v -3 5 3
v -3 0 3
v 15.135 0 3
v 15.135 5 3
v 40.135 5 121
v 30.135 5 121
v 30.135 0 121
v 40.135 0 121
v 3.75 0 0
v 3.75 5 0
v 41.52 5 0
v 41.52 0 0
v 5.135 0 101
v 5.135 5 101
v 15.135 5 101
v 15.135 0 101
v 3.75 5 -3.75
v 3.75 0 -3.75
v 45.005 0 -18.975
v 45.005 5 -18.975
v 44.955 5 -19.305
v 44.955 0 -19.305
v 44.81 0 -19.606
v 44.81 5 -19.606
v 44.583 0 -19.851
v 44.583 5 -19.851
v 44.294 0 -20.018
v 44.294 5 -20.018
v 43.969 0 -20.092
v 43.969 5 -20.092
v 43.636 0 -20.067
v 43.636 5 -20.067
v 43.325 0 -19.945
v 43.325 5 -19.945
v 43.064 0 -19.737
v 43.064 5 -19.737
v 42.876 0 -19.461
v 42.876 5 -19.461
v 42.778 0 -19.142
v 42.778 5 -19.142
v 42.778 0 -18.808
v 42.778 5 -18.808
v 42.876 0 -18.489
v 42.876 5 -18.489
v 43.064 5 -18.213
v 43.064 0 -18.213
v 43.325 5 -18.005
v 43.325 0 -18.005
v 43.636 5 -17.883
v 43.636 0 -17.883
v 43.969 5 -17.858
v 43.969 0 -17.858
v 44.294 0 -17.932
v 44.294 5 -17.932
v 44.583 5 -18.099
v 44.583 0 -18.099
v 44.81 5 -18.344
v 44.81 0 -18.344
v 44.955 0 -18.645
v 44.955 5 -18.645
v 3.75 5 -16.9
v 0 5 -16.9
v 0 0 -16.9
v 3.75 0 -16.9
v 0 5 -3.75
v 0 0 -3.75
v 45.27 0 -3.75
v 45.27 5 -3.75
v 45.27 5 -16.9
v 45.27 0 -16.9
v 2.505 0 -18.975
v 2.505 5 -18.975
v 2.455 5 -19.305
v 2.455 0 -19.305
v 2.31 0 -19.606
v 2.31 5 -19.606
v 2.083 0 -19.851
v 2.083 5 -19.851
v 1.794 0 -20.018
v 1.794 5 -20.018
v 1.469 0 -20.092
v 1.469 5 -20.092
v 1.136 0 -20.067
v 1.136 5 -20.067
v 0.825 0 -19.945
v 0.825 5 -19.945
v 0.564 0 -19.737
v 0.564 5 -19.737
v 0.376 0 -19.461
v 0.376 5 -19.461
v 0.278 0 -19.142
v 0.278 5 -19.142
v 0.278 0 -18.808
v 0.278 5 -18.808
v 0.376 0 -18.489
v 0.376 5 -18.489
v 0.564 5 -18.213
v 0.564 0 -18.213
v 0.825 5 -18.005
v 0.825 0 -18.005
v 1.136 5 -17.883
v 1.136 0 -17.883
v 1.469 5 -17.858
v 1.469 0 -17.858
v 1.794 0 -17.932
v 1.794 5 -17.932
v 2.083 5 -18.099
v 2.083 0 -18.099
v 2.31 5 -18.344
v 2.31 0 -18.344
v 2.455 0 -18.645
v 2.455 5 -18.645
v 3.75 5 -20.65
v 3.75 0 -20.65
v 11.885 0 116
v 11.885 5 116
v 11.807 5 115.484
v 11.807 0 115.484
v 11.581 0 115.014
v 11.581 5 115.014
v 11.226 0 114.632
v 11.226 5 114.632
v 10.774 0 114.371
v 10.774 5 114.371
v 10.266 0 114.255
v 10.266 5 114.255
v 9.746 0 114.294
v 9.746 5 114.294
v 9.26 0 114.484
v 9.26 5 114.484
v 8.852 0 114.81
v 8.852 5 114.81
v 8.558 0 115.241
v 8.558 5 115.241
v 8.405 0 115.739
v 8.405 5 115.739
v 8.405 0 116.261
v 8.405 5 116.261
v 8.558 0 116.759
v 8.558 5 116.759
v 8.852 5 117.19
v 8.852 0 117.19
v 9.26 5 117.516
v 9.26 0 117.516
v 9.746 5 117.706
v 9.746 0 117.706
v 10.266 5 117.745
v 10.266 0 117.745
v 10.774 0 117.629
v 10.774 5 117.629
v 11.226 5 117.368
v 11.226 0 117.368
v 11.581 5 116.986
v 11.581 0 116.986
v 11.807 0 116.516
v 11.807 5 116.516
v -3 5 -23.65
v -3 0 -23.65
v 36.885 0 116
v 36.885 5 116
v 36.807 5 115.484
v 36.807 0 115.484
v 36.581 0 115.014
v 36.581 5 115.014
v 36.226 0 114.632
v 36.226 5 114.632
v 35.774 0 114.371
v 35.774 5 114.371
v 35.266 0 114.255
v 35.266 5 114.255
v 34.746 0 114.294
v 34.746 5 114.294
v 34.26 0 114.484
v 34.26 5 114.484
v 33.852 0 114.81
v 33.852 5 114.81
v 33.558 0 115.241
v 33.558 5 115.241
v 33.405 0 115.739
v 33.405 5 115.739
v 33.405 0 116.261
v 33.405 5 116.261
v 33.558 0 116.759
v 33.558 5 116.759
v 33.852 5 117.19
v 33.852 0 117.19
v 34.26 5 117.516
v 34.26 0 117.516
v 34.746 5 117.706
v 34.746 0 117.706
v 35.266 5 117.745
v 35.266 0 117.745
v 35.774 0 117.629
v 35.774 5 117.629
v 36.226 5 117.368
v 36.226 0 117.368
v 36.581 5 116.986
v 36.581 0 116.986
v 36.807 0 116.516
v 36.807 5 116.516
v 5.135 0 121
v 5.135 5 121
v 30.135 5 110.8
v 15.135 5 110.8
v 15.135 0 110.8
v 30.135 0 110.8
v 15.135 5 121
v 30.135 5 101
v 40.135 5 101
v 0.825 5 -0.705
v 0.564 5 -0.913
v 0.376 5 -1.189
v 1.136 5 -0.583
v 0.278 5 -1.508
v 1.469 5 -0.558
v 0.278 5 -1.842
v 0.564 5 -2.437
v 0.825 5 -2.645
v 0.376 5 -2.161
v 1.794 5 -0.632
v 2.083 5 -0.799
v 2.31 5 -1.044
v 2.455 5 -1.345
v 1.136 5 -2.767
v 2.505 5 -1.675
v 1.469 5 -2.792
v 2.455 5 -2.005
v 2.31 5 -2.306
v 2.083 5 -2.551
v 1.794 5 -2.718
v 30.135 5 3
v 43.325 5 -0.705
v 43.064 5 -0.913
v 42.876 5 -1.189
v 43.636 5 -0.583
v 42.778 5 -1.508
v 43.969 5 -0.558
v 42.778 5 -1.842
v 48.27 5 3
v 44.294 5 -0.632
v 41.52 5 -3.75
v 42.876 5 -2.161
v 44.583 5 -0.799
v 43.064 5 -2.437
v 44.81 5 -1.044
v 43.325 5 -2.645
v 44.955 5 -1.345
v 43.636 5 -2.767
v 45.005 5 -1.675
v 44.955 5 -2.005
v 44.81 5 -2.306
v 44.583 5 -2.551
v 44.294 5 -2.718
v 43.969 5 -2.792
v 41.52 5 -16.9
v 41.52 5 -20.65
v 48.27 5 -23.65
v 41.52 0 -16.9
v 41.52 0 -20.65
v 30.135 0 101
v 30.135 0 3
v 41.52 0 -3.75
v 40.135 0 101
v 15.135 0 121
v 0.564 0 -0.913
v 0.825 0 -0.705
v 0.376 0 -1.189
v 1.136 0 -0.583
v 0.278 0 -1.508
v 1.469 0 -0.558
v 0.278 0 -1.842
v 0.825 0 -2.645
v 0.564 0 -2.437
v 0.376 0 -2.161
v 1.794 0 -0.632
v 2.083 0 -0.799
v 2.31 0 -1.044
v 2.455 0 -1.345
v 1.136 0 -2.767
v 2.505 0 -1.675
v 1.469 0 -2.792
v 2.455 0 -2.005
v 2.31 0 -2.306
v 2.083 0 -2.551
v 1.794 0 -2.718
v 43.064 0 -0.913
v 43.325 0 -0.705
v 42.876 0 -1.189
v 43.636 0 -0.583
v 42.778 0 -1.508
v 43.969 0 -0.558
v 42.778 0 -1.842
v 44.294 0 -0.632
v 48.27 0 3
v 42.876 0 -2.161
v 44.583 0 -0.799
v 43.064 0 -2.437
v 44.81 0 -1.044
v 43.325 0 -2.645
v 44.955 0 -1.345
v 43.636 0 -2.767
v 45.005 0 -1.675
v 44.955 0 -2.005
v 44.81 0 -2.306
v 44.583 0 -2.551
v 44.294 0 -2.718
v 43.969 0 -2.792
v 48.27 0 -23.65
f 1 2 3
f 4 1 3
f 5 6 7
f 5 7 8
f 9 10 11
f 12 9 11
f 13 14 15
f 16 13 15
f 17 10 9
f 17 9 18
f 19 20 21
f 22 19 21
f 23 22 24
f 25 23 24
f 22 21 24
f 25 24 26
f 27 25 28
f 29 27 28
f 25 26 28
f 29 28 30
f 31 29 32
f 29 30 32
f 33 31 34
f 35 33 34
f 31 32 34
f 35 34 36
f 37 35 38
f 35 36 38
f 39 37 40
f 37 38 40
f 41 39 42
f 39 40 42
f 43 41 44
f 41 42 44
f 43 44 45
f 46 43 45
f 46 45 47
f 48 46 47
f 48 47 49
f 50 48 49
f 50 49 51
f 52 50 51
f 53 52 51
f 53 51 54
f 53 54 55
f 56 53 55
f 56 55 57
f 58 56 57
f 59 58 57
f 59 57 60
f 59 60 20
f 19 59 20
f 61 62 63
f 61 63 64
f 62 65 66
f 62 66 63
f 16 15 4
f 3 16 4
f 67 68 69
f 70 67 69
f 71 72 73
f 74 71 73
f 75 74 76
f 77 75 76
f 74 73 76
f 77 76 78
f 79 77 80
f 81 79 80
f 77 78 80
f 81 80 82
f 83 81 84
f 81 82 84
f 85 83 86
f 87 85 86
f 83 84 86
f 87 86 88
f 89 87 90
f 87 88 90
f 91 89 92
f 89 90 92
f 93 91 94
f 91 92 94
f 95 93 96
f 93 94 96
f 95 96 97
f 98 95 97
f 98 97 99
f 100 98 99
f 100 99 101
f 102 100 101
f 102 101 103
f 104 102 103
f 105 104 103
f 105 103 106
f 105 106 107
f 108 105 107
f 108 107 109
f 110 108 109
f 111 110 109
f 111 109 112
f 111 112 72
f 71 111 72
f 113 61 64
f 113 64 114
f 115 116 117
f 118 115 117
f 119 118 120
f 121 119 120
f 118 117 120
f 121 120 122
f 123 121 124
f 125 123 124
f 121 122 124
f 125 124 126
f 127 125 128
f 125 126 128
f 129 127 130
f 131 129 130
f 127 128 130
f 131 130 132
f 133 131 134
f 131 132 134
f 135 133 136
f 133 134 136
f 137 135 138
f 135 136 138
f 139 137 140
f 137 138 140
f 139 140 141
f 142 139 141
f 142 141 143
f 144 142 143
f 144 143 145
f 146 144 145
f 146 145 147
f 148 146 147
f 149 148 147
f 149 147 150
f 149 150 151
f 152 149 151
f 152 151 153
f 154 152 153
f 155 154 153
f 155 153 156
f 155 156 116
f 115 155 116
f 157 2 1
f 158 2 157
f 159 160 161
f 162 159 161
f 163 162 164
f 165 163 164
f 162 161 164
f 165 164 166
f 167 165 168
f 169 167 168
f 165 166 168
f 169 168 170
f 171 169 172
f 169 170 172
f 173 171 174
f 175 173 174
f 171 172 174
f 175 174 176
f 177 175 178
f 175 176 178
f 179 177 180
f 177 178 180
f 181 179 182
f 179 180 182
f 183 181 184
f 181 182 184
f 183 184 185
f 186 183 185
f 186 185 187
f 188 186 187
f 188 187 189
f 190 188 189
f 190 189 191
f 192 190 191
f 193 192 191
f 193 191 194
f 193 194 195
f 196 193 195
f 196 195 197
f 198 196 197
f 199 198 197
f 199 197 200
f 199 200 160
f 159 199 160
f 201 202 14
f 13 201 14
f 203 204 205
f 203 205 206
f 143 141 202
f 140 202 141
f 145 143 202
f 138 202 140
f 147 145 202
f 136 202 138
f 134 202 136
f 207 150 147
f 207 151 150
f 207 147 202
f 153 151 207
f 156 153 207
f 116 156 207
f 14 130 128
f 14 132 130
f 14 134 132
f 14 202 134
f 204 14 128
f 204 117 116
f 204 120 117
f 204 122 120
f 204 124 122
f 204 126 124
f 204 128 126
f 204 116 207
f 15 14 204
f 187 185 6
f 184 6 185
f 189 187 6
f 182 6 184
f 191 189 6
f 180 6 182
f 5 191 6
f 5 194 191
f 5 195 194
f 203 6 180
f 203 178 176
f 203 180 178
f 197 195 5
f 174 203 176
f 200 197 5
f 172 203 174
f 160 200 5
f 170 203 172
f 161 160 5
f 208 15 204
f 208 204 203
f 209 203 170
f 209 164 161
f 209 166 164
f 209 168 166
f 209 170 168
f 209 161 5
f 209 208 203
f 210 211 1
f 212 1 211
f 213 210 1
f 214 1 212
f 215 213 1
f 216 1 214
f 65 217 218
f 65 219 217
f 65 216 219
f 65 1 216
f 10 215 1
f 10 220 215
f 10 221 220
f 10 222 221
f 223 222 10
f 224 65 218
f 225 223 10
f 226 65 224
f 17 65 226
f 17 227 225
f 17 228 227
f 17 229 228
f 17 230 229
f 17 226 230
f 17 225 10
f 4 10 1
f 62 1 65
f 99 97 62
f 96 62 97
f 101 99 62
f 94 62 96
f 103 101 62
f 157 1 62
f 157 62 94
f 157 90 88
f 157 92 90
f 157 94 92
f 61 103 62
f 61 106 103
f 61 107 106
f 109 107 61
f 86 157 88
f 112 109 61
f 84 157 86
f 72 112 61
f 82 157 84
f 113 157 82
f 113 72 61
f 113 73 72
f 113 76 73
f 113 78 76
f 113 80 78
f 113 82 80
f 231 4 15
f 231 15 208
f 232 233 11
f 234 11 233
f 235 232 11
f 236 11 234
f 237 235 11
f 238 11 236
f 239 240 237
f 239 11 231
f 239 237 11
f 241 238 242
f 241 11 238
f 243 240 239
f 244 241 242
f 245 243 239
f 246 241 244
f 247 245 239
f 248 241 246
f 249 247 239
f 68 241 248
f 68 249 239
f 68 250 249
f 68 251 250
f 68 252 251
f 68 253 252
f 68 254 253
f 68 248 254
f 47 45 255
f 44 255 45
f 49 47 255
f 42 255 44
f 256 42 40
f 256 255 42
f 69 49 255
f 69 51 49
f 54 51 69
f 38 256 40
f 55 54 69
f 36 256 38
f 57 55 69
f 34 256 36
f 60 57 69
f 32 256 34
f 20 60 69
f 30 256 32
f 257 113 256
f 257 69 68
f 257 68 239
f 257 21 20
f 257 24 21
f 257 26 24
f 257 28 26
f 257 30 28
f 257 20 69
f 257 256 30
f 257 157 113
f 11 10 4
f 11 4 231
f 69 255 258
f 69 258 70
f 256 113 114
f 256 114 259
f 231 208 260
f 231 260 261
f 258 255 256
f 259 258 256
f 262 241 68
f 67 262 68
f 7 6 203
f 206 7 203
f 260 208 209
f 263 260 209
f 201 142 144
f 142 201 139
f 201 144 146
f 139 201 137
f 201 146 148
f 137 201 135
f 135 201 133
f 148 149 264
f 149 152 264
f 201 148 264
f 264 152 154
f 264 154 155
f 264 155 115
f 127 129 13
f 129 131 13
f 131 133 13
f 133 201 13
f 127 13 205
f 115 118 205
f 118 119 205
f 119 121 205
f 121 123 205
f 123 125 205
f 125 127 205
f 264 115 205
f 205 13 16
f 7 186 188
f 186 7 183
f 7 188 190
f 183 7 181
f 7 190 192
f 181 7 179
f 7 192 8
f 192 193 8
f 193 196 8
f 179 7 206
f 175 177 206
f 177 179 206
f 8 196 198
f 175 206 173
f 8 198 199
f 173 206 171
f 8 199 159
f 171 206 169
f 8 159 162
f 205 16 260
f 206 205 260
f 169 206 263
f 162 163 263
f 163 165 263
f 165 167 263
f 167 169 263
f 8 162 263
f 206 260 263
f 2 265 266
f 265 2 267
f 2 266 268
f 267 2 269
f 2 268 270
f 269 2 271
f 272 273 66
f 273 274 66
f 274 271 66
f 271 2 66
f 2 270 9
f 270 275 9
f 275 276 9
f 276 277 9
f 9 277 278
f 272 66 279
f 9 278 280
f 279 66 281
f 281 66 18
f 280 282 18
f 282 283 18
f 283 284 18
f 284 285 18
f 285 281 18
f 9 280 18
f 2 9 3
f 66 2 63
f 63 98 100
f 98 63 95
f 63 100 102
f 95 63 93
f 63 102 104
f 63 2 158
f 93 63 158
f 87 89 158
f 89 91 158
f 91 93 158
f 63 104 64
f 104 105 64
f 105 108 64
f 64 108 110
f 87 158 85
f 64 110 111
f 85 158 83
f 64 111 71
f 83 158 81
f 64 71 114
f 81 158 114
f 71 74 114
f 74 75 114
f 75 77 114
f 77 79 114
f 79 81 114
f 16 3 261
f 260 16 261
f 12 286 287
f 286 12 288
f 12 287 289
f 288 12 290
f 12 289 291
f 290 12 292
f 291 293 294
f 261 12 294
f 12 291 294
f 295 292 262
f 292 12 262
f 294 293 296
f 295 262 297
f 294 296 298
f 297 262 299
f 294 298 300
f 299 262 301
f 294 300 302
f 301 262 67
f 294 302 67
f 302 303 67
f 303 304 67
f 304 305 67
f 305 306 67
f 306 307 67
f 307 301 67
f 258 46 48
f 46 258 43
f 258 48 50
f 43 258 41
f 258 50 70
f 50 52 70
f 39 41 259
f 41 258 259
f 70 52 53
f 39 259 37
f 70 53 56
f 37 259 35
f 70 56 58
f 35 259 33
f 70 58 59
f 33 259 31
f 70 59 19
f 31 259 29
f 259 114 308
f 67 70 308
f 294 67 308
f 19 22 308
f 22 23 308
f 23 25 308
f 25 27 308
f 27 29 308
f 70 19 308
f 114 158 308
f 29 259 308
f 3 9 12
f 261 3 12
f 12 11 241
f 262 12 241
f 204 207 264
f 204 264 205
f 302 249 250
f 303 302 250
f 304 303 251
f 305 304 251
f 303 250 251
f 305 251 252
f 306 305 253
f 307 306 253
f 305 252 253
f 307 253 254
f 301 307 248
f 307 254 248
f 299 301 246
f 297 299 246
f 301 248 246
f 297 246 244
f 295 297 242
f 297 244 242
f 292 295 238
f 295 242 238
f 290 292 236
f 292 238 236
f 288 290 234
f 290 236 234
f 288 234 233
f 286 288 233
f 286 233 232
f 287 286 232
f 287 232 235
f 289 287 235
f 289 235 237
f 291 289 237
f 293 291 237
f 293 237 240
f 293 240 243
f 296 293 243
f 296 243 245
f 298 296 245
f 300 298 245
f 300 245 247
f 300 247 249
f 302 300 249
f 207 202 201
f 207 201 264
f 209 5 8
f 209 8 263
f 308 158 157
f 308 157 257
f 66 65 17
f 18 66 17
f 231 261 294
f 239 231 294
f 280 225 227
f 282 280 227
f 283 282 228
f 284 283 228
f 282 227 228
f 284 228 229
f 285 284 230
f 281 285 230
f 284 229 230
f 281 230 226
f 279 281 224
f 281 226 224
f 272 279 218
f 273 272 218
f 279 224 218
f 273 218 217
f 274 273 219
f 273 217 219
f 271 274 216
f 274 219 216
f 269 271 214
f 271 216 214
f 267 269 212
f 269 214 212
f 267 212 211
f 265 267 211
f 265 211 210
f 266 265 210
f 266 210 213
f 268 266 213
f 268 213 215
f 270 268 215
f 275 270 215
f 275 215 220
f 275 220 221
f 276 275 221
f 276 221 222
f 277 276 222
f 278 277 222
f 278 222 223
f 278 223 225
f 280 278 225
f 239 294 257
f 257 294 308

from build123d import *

# Parameters (mm, degrees)
SKETCH2_W           = 51.27
SKETCH2_H           = 26.65
BOSS_EXTRUDE2_DEPTH = 5
SKETCH3_W           = 45.27
SKETCH3_H           = 20.65
CUT_EXTRUDE1_DEPTH  = 6
SKETCH4_W           = 3.75
SKETCH4_H           = 3.75
BOSS_EXTRUDE3_DEPTH = 5
SKETCH5_R           = 1.12
CUT_EXTRUDE2_DEPTH  = 6
SKETCH6_W           = 15
SKETCH6_H           = 108
BOSS_EXTRUDE4_DEPTH = 5
SKETCH7_W           = 10
SKETCH7_H           = 20
BOSS_EXTRUDE5_DEPTH = 5
SKETCH8_R           = 1.75
CUT_EXTRUDE3_DEPTH  = 6
SKETCH9_W           = 15
SKETCH9_H           = 0.2
CUT_EXTRUDE4_DEPTH  = 6


with BuildPart() as part:
    # Sketch2 → Boss-Extrude2 (new body)
    with BuildSketch(Plane(origin=(0, 0, 0), x_dir=(1, 0, 0), z_dir=(0, 1, 0))):
        with Locations((22.635, 10.325)):
            Rectangle(SKETCH2_W, SKETCH2_H)
    extrude(amount=BOSS_EXTRUDE2_DEPTH)

    # Sketch3 → Cut-Extrude1 (cut, through all)
    with BuildSketch(Plane(origin=(0, 5, 0), x_dir=(1, 0, 0), z_dir=(0, 1, 0))):
        with Locations((22.635, 10.325)):
            Rectangle(SKETCH3_W, SKETCH3_H)
    extrude(amount=-CUT_EXTRUDE1_DEPTH, mode=Mode.SUBTRACT)

    # Sketch4 → Boss-Extrude3 (add)
    with BuildSketch(Plane(origin=(0, 5, 0), x_dir=(1, 0, 0), z_dir=(0, 1, 0))):
        with Locations((1.875, 18.775)):
            Rectangle(SKETCH4_W, SKETCH4_H)
        with Locations((1.875, 1.875)):
            Rectangle(SKETCH4_W, SKETCH4_H)
        with Locations((43.395, 1.875)):
            Rectangle(SKETCH4_W, SKETCH4_H)
        with Locations((43.395, 18.775)):
            Rectangle(SKETCH4_W, SKETCH4_H)
    extrude(amount=-BOSS_EXTRUDE3_DEPTH)

    # Sketch5 → Cut-Extrude2 (cut, through all)
    with BuildSketch(Plane(origin=(0, 5, 0), x_dir=(1, 0, 0), z_dir=(0, 1, 0))):
        with Locations((1.385, 18.975)):
            Circle(SKETCH5_R)
        with Locations((43.885, 18.975)):
            Circle(SKETCH5_R)
        with Locations((43.885, 1.675)):
            Circle(SKETCH5_R)
        with Locations((1.385, 1.675)):
            Circle(SKETCH5_R)
    extrude(amount=-CUT_EXTRUDE2_DEPTH, mode=Mode.SUBTRACT)

    # Sketch6 → Boss-Extrude4 (add)
    with BuildSketch(Plane(origin=(0, 5, 0), x_dir=(1, 0, 0), z_dir=(0, 1, 0))):
        with Locations((22.635, -57)):
            Rectangle(SKETCH6_W, SKETCH6_H)
    extrude(amount=-BOSS_EXTRUDE4_DEPTH)

    # Sketch7 → Boss-Extrude5 (add)
    with BuildSketch(Plane(origin=(0, 5, 0), x_dir=(1, 0, 0), z_dir=(0, 1, 0))):
        with Locations((35.135, -111)):
            Rectangle(SKETCH7_W, SKETCH7_H)
        with Locations((10.135, -111)):
            Rectangle(SKETCH7_W, SKETCH7_H)
    extrude(amount=-BOSS_EXTRUDE5_DEPTH)

    # Sketch8 → Cut-Extrude3 (cut, through all)
    with BuildSketch(Plane(origin=(0, 5, 0), x_dir=(1, 0, 0), z_dir=(0, 1, 0))):
        with Locations((10.135, -116)):
            Circle(SKETCH8_R)
        with Locations((35.135, -116)):
            Circle(SKETCH8_R)
    extrude(amount=-CUT_EXTRUDE3_DEPTH, mode=Mode.SUBTRACT)

    # Sketch9 → Cut-Extrude4 (cut, through all)
    with BuildSketch(Plane(origin=(0, 5, 0), x_dir=(1, 0, 0), z_dir=(0, 1, 0))):
        with Locations((22.635, -110.9)):
            Rectangle(SKETCH9_W, SKETCH9_H)
    extrude(amount=-CUT_EXTRUDE4_DEPTH, mode=Mode.SUBTRACT)


solid = part.part
